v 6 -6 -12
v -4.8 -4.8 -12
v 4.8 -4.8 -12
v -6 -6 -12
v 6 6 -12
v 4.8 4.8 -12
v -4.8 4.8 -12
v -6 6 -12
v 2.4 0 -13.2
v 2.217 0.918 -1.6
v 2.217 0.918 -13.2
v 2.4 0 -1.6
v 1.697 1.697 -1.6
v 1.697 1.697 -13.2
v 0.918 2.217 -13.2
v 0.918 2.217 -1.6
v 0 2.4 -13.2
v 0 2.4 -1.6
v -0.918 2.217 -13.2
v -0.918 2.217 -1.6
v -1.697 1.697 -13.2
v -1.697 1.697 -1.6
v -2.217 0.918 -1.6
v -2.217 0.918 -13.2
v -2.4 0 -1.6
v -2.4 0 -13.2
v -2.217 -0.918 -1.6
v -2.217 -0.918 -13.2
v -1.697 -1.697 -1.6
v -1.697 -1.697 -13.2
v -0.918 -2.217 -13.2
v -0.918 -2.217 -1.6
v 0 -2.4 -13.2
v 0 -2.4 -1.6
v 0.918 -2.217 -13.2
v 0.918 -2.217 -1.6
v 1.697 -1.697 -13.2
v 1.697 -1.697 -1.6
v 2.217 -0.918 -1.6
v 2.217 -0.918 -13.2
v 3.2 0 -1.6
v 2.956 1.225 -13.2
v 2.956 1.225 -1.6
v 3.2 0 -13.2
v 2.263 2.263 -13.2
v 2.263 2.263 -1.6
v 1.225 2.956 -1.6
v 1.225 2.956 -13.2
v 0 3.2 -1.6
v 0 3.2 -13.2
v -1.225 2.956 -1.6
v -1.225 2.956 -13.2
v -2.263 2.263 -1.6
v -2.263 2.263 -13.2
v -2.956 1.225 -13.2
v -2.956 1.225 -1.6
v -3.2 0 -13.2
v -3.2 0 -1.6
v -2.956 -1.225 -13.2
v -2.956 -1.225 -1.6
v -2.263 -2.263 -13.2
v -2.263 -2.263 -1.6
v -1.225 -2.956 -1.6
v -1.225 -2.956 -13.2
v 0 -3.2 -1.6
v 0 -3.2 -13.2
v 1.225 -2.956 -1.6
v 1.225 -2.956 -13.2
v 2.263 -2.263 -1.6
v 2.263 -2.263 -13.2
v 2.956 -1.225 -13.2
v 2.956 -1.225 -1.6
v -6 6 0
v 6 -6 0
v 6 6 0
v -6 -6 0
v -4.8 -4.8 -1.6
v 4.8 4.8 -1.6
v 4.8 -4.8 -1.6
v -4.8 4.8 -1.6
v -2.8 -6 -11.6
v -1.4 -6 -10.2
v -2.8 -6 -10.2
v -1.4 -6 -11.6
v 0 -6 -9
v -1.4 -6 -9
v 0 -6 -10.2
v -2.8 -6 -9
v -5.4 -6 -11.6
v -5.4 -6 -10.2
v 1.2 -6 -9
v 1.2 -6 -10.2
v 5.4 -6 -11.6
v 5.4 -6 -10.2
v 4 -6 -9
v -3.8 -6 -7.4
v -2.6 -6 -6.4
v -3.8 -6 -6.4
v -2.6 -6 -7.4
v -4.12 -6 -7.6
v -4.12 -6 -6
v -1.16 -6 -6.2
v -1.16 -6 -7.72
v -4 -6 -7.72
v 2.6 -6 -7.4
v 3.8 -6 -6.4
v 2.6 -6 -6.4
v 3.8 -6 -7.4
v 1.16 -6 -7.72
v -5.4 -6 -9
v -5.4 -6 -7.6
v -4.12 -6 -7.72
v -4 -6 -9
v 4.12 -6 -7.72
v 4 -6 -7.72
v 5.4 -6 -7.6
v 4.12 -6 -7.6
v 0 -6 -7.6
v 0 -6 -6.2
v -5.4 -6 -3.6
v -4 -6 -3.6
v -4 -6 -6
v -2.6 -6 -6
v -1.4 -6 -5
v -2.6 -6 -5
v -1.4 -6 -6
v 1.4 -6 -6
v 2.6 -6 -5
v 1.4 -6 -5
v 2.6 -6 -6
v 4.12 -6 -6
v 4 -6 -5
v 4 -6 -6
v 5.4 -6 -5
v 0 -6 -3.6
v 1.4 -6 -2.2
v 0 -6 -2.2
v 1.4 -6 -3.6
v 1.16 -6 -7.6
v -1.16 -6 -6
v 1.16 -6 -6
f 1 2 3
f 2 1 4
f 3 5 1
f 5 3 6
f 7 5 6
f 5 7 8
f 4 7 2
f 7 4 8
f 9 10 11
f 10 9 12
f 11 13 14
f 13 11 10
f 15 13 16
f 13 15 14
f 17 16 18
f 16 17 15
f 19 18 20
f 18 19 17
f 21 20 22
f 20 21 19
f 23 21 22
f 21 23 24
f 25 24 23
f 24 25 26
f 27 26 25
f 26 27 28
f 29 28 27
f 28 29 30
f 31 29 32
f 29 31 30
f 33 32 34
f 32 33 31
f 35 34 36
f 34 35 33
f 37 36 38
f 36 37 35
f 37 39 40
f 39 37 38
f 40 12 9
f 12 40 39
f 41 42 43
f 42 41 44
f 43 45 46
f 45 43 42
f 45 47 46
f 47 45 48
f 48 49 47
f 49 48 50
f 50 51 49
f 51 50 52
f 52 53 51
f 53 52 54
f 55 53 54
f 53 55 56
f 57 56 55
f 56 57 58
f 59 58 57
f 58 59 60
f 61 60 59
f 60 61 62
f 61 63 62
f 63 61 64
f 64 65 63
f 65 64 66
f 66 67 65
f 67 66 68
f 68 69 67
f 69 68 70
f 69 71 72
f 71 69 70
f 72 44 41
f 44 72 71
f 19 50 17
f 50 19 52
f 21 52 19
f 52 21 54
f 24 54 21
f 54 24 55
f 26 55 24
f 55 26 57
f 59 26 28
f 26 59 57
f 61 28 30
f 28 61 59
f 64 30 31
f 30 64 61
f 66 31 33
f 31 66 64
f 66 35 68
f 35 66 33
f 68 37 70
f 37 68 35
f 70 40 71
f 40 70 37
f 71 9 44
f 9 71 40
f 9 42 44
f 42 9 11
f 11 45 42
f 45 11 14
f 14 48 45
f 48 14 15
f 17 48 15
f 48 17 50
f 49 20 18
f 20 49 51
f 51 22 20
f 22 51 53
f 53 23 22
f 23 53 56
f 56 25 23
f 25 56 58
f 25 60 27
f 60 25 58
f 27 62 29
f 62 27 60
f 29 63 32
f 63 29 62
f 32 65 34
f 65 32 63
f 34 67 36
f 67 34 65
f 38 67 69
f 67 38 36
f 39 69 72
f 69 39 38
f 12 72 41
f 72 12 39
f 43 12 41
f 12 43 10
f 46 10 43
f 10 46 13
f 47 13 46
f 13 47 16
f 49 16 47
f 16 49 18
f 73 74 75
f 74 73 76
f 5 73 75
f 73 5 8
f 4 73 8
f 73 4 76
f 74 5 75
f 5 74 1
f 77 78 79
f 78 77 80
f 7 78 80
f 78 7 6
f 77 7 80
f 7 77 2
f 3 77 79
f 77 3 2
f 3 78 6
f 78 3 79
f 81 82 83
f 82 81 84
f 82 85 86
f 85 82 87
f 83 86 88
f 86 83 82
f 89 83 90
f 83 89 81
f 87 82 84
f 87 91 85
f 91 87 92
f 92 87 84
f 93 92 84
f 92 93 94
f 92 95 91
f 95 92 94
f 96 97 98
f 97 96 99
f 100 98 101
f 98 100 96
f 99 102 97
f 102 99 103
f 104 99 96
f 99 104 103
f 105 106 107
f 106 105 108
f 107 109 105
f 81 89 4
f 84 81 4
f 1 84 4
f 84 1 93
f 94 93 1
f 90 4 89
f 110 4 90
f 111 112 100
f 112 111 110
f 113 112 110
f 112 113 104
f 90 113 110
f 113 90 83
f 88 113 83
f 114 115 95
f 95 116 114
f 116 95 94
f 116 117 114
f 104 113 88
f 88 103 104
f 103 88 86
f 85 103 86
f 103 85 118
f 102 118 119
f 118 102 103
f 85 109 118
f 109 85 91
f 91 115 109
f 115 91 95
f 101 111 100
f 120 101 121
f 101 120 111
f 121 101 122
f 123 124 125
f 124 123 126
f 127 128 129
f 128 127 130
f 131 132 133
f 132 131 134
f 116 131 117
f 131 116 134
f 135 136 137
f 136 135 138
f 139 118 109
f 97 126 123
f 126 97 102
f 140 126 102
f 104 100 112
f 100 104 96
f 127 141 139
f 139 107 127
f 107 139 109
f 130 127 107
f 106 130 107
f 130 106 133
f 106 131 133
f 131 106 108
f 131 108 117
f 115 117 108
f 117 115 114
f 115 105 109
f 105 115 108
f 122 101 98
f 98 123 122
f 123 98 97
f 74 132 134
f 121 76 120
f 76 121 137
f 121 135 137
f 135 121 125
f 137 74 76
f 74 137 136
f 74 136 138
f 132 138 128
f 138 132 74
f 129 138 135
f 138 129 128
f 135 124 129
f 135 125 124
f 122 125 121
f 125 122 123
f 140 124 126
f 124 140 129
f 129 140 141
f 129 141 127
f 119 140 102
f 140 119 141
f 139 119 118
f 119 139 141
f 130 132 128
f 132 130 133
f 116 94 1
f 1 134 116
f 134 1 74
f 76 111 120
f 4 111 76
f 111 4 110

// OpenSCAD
// file: ../p/4-4ring3.scad
use <../lib.scad>
$fa=1; $fs=0.2;
function ldraw_lib__4_4ring3(realsolid=false) = [
// 0 Ring  3 x 1.0
// 0 Name: 4-4ring3.dat
// 0 Author: James Jessiman
// 0 !LDRAW_ORG Primitive UPDATE 2009-01
// 0 !LICENSE Licensed under CC BY 2.0 and CC BY 4.0 : see CAreadme.txt
// 
// 0 BFC CERTIFY CCW
  [0,"BFC","CERTIFY"],
  [0,"BFC","CCW"],
// 
// 0 !HISTORY 1998-12-15 [PTadmin] Official Update 1998-10
// 0 !HISTORY 2002-04-05 [hafhead] Added BFC statement
// 0 !HISTORY 2002-04-25 [PTadmin] Official Update 2002-02
// 0 !HISTORY 2007-06-24 [PTadmin] Header formatted for Contributor Agreement
// 0 !HISTORY 2008-07-01 [PTadmin] Official Update 2008-01
// 0 !HISTORY 2008-08-26 [cwdee] Switch polygon winding and rename
// 0 !HISTORY 2009-05-02 [PTadmin] Official Update 2009-01
// 
// 
// 4 16 -1.5308 0 3.6956 -1.1481 0 2.7717 0 0 3 0 0 4
  [4,16,-1.5308,0,3.6956,-1.1481,0,2.7717,0,0,3,0,0,4],
// 4 16 -2.8284 0 2.8284 -2.1213 0 2.1213 -1.1481 0 2.7717 -1.5308 0 3.6956
  [4,16,-2.8284,0,2.8284,-2.1213,0,2.1213,-1.1481,0,2.7717,-1.5308,0,3.6956],
// 4 16 -3.6956 0 1.5308 -2.7717 0 1.1481 -2.1213 0 2.1213 -2.8284 0 2.8284
  [4,16,-3.6956,0,1.5308,-2.7717,0,1.1481,-2.1213,0,2.1213,-2.8284,0,2.8284],
// 4 16 -4 0 0 -3 0 0 -2.7717 0 1.1481 -3.6956 0 1.5308
  [4,16,-4,0,0,-3,0,0,-2.7717,0,1.1481,-3.6956,0,1.5308],
// 4 16 -3.6956 0 -1.5308 -2.7717 0 -1.1481 -3 0 0 -4 0 0
  [4,16,-3.6956,0,-1.5308,-2.7717,0,-1.1481,-3,0,0,-4,0,0],
// 4 16 -2.8284 0 -2.8284 -2.1213 0 -2.1213 -2.7717 0 -1.1481 -3.6956 0 -1.5308
  [4,16,-2.8284,0,-2.8284,-2.1213,0,-2.1213,-2.7717,0,-1.1481,-3.6956,0,-1.5308],
// 4 16 -1.5308 0 -3.6956 -1.1481 0 -2.7717 -2.1213 0 -2.1213 -2.8284 0 -2.8284
  [4,16,-1.5308,0,-3.6956,-1.1481,0,-2.7717,-2.1213,0,-2.1213,-2.8284,0,-2.8284],
// 4 16 0 0 -4 0 0 -3 -1.1481 0 -2.7717 -1.5308 0 -3.6956
  [4,16,0,0,-4,0,0,-3,-1.1481,0,-2.7717,-1.5308,0,-3.6956],
// 4 16 1.5308 0 -3.6956 1.1481 0 -2.7717 0 0 -3 0 0 -4
  [4,16,1.5308,0,-3.6956,1.1481,0,-2.7717,0,0,-3,0,0,-4],
// 4 16 2.8284 0 -2.8284 2.1213 0 -2.1213 1.1481 0 -2.7717 1.5308 0 -3.6956
  [4,16,2.8284,0,-2.8284,2.1213,0,-2.1213,1.1481,0,-2.7717,1.5308,0,-3.6956],
// 4 16 3.6956 0 -1.5308 2.7717 0 -1.1481 2.1213 0 -2.1213 2.8284 0 -2.8284
  [4,16,3.6956,0,-1.5308,2.7717,0,-1.1481,2.1213,0,-2.1213,2.8284,0,-2.8284],
// 4 16 4 0 0 3 0 0 2.7717 0 -1.1481 3.6956 0 -1.5308
  [4,16,4,0,0,3,0,0,2.7717,0,-1.1481,3.6956,0,-1.5308],
// 4 16 3.6956 0 1.5308 2.7717 0 1.1481 3 0 0 4 0 0
  [4,16,3.6956,0,1.5308,2.7717,0,1.1481,3,0,0,4,0,0],
// 4 16 2.8284 0 2.8284 2.1213 0 2.1213 2.7717 0 1.1481 3.6956 0 1.5308
  [4,16,2.8284,0,2.8284,2.1213,0,2.1213,2.7717,0,1.1481,3.6956,0,1.5308],
// 4 16 1.5308 0 3.6956 1.1481 0 2.7717 2.1213 0 2.1213 2.8284 0 2.8284
  [4,16,1.5308,0,3.6956,1.1481,0,2.7717,2.1213,0,2.1213,2.8284,0,2.8284],
// 4 16 0 0 4 0 0 3 1.1481 0 2.7717 1.5308 0 3.6956
  [4,16,0,0,4,0,0,3,1.1481,0,2.7717,1.5308,0,3.6956],
// 0
];
module ldraw_lib__4_4ring3(step=0, col=false, unit=2/5, alt=false, line=0.2, solid=!$preview)
    makepoly(ldraw_lib__4_4ring3(solid), step=step, col=col, unit=unit, alt=alt, line=line, solid=solid);
ldraw_lib__4_4ring3(line=0.2);
// file: ../p/4-4edge.scad
use <../lib.scad>
function ldraw_lib__4_4edge() = [
// 0 Circle 1.0
// 0 Name: 4-4edge.dat
// 0 Author: James Jessiman
// 0 !LDRAW_ORG Primitive UPDATE 2017-01
// 0 !LICENSE Licensed under CC BY 2.0 and CC BY 4.0 : see CAreadme.txt
// 
// 0 BFC CERTIFY CCW
  [0,"BFC","CERTIFY"],
  [0,"BFC","CCW"],
// 
// 0 !HISTORY 1998-12-15 [PTadmin] Official Update 1998-10
// 0 !HISTORY 2005-12-28 [PTadmin] Official Update 2005-01
// 0 !HISTORY 2007-06-24 [PTadmin] Header formatted for Contributor Agreement
// 0 !HISTORY 2008-07-01 [PTadmin] Official Update 2008-01
// 0 !HISTORY 2017-01-15 [Steffen] BFCed
// 0 !HISTORY 2017-12-30 [PTadmin] Official Update 2017-01
// 
// 
// 2 24 1 0 0 0.9239 0 0.3827
  [2,24,1,0,0,0.9239,0,0.3827],
// 2 24 0.9239 0 0.3827 0.7071 0 0.7071
  [2,24,0.9239,0,0.3827,0.7071,0,0.7071],
// 2 24 0.7071 0 0.7071 0.3827 0 0.9239
  [2,24,0.7071,0,0.7071,0.3827,0,0.9239],
// 2 24 0.3827 0 0.9239 0 0 1
  [2,24,0.3827,0,0.9239,0,0,1],
// 2 24 0 0 1 -0.3827 0 0.9239
  [2,24,0,0,1,-0.3827,0,0.9239],
// 2 24 -0.3827 0 0.9239 -0.7071 0 0.7071
  [2,24,-0.3827,0,0.9239,-0.7071,0,0.7071],
// 2 24 -0.7071 0 0.7071 -0.9239 0 0.3827
  [2,24,-0.7071,0,0.7071,-0.9239,0,0.3827],
// 2 24 -0.9239 0 0.3827 -1 0 -0
  [2,24,-0.9239,0,0.3827,-1,0,-0],
// 2 24 -1 0 -0 -0.9239 0 -0.3827
  [2,24,-1,0,-0,-0.9239,0,-0.3827],
// 2 24 -0.9239 0 -0.3827 -0.7071 0 -0.7071
  [2,24,-0.9239,0,-0.3827,-0.7071,0,-0.7071],
// 2 24 -0.7071 0 -0.7071 -0.3827 0 -0.9239
  [2,24,-0.7071,0,-0.7071,-0.3827,0,-0.9239],
// 2 24 -0.3827 0 -0.9239 0 0 -1
  [2,24,-0.3827,0,-0.9239,0,0,-1],
// 2 24 0 0 -1 0.3827 0 -0.9239
  [2,24,0,0,-1,0.3827,0,-0.9239],
// 2 24 0.3827 0 -0.9239 0.7071 0 -0.7071
  [2,24,0.3827,0,-0.9239,0.7071,0,-0.7071],
// 2 24 0.7071 0 -0.7071 0.9239 0 -0.3827
  [2,24,0.7071,0,-0.7071,0.9239,0,-0.3827],
// 2 24 0.9239 0 -0.3827 1 0 0
  [2,24,0.9239,0,-0.3827,1,0,0],
];
module ldraw_lib__4_4edge(step=0, col=false, unit=2/5, alt=false, line=0.2, solid=!$preview)
    makepoly(ldraw_lib__4_4edge(), step=step, col=col, unit=unit, alt=alt, line=line, solid=solid);
ldraw_lib__4_4edge(line=0.2);
// file: ../p/4-4cyli.scad
use <../lib.scad>
$fa=1; $fs=0.2;
function ldraw_lib__4_4cyli(realsolid=false) = [
// 0 Cylinder 1.0
// 0 Name: 4-4cyli.dat
// 0 Author: James Jessiman
// 0 !LDRAW_ORG Primitive UPDATE 2005-01
// 0 !LICENSE Licensed under CC BY 2.0 and CC BY 4.0 : see CAreadme.txt
// 
// 0 BFC CERTIFY CCW
  [0,"BFC","CERTIFY"],
  [0,"BFC","CCW"],
// 
// 0 !HISTORY 1998-12-15 [PTadmin] Official Update 1998-10
// 0 !HISTORY 2002-03-23 [sbliss] Added BFC statement; merged headers from files in distributions LDraw 0.27 and Complete.
// 0 !HISTORY 2002-04-25 [PTadmin] Official Update 2002-02
// 0 !HISTORY 2004-12-14 [guyvivan] BFC CCW
// 0 !HISTORY 2005-12-28 [PTadmin] Official Update 2005-01
// 0 !HISTORY 2007-06-24 [PTadmin] Header formatted for Contributor Agreement
// 0 !HISTORY 2008-07-01 [PTadmin] Official Update 2008-01
// 
// 
// 4 16 1 1 0 0.9239 1 0.3827 0.9239 0 0.3827 1 0 0
  [4,16,1,1,0,0.9239,1,0.3827,0.9239,0,0.3827,1,0,0],
// 5 24 1 0 0 1 1 0 0.9239 0 0.3827 0.9239 0 -0.3827
  [5,24,1,0,0,1,1,0,0.9239,0,0.3827,0.9239,0,-0.3827],
// 4 16 0.9239 1 0.3827 0.7071 1 0.7071 0.7071 0 0.7071 0.9239 0 0.3827
  [4,16,0.9239,1,0.3827,0.7071,1,0.7071,0.7071,0,0.7071,0.9239,0,0.3827],
// 5 24 0.9239 0 0.3827 0.9239 1 0.3827 0.7071 0 0.7071 1 0 0
  [5,24,0.9239,0,0.3827,0.9239,1,0.3827,0.7071,0,0.7071,1,0,0],
// 4 16 0.7071 1 0.7071 0.3827 1 0.9239 0.3827 0 0.9239 0.7071 0 0.7071
  [4,16,0.7071,1,0.7071,0.3827,1,0.9239,0.3827,0,0.9239,0.7071,0,0.7071],
// 5 24 0.7071 0 0.7071 0.7071 1 0.7071 0.3827 0 0.9239 0.9239 0 0.3827
  [5,24,0.7071,0,0.7071,0.7071,1,0.7071,0.3827,0,0.9239,0.9239,0,0.3827],
// 4 16 0.3827 1 0.9239 0 1 1 0 0 1 0.3827 0 0.9239
  [4,16,0.3827,1,0.9239,0,1,1,0,0,1,0.3827,0,0.9239],
// 5 24 0.3827 0 0.9239 0.3827 1 0.9239 0 0 1 0.7071 0 0.7071
  [5,24,0.3827,0,0.9239,0.3827,1,0.9239,0,0,1,0.7071,0,0.7071],
// 4 16 0 1 1 -0.3827 1 0.9239 -0.3827 0 0.9239 0 0 1
  [4,16,0,1,1,-0.3827,1,0.9239,-0.3827,0,0.9239,0,0,1],
// 5 24 0 0 1 0 1 1 -0.3827 0 0.9239 0.3827 0 0.9239
  [5,24,0,0,1,0,1,1,-0.3827,0,0.9239,0.3827,0,0.9239],
// 4 16 -0.3827 1 0.9239 -0.7071 1 0.7071 -0.7071 0 0.7071 -0.3827 0 0.9239
  [4,16,-0.3827,1,0.9239,-0.7071,1,0.7071,-0.7071,0,0.7071,-0.3827,0,0.9239],
// 5 24 -0.3827 0 0.9239 -0.3827 1 0.9239 -0.7071 0 0.7071 0 0 1
  [5,24,-0.3827,0,0.9239,-0.3827,1,0.9239,-0.7071,0,0.7071,0,0,1],
// 4 16 -0.7071 1 0.7071 -0.9239 1 0.3827 -0.9239 0 0.3827 -0.7071 0 0.7071
  [4,16,-0.7071,1,0.7071,-0.9239,1,0.3827,-0.9239,0,0.3827,-0.7071,0,0.7071],
// 5 24 -0.7071 0 0.7071 -0.7071 1 0.7071 -0.9239 0 0.3827 -0.3827 0 0.9239
  [5,24,-0.7071,0,0.7071,-0.7071,1,0.7071,-0.9239,0,0.3827,-0.3827,0,0.9239],
// 4 16 -0.9239 1 0.3827 -1 1 0 -1 0 0 -0.9239 0 0.3827
  [4,16,-0.9239,1,0.3827,-1,1,0,-1,0,0,-0.9239,0,0.3827],
// 5 24 -0.9239 0 0.3827 -0.9239 1 0.3827 -1 0 0 -0.7071 0 0.7071
  [5,24,-0.9239,0,0.3827,-0.9239,1,0.3827,-1,0,0,-0.7071,0,0.7071],
// 4 16 -1 1 0 -0.9239 1 -0.3827 -0.9239 0 -0.3827 -1 0 0
  [4,16,-1,1,0,-0.9239,1,-0.3827,-0.9239,0,-0.3827,-1,0,0],
// 5 24 -1 0 0 -1 1 0 -0.9239 0 -0.3827 -0.9239 0 0.3827
  [5,24,-1,0,0,-1,1,0,-0.9239,0,-0.3827,-0.9239,0,0.3827],
// 4 16 -0.9239 1 -0.3827 -0.7071 1 -0.7071 -0.7071 0 -0.7071 -0.9239 0 -0.3827
  [4,16,-0.9239,1,-0.3827,-0.7071,1,-0.7071,-0.7071,0,-0.7071,-0.9239,0,-0.3827],
// 5 24 -0.9239 0 -0.3827 -0.9239 1 -0.3827 -0.7071 0 -0.7071 -1 0 0
  [5,24,-0.9239,0,-0.3827,-0.9239,1,-0.3827,-0.7071,0,-0.7071,-1,0,0],
// 4 16 -0.7071 1 -0.7071 -0.3827 1 -0.9239 -0.3827 0 -0.9239 -0.7071 0 -0.7071
  [4,16,-0.7071,1,-0.7071,-0.3827,1,-0.9239,-0.3827,0,-0.9239,-0.7071,0,-0.7071],
// 5 24 -0.7071 0 -0.7071 -0.7071 1 -0.7071 -0.3827 0 -0.9239 -0.9239 0 -0.3827
  [5,24,-0.7071,0,-0.7071,-0.7071,1,-0.7071,-0.3827,0,-0.9239,-0.9239,0,-0.3827],
// 4 16 -0.3827 1 -0.9239 0 1 -1 0 0 -1 -0.3827 0 -0.9239
  [4,16,-0.3827,1,-0.9239,0,1,-1,0,0,-1,-0.3827,0,-0.9239],
// 5 24 -0.3827 0 -0.9239 -0.3827 1 -0.9239 0 0 -1 -0.7071 0 -0.7071
  [5,24,-0.3827,0,-0.9239,-0.3827,1,-0.9239,0,0,-1,-0.7071,0,-0.7071],
// 4 16 0 1 -1 0.3827 1 -0.9239 0.3827 0 -0.9239 0 0 -1
  [4,16,0,1,-1,0.3827,1,-0.9239,0.3827,0,-0.9239,0,0,-1],
// 5 24 0 0 -1 0 1 -1 0.3827 0 -0.9239 -0.3827 0 -0.9239
  [5,24,0,0,-1,0,1,-1,0.3827,0,-0.9239,-0.3827,0,-0.9239],
// 4 16 0.3827 1 -0.9239 0.7071 1 -0.7071 0.7071 0 -0.7071 0.3827 0 -0.9239
  [4,16,0.3827,1,-0.9239,0.7071,1,-0.7071,0.7071,0,-0.7071,0.3827,0,-0.9239],
// 5 24 0.3827 0 -0.9239 0.3827 1 -0.9239 0.7071 0 -0.7071 0 0 -1
  [5,24,0.3827,0,-0.9239,0.3827,1,-0.9239,0.7071,0,-0.7071,0,0,-1],
// 4 16 0.7071 1 -0.7071 0.9239 1 -0.3827 0.9239 0 -0.3827 0.7071 0 -0.7071
  [4,16,0.7071,1,-0.7071,0.9239,1,-0.3827,0.9239,0,-0.3827,0.7071,0,-0.7071],
// 5 24 0.7071 0 -0.7071 0.7071 1 -0.7071 0.9239 0 -0.3827 0.3827 0 -0.9239
  [5,24,0.7071,0,-0.7071,0.7071,1,-0.7071,0.9239,0,-0.3827,0.3827,0,-0.9239],
// 4 16 0.9239 1 -0.3827 1 1 0 1 0 0 0.9239 0 -0.3827
  [4,16,0.9239,1,-0.3827,1,1,0,1,0,0,0.9239,0,-0.3827],
// 5 24 0.9239 0 -0.3827 0.9239 1 -0.3827 1 0 0 0.7071 0 -0.7071
  [5,24,0.9239,0,-0.3827,0.9239,1,-0.3827,1,0,0,0.7071,0,-0.7071],
// 0
];
module ldraw_lib__4_4cyli(step=0, col=false, unit=2/5, alt=false, line=0.2, solid=!$preview)
    makepoly(ldraw_lib__4_4cyli(solid), step=step, col=col, unit=unit, alt=alt, line=line, solid=solid);
ldraw_lib__4_4cyli(line=0.2);
// file: ../p/stud4.scad
use <../lib.scad>
use <4-4cyli.scad>
use <4-4edge.scad>
use <4-4ring3.scad>
function ldraw_lib__stud4() = [
// 0 Stud Tube Open
// 0 Name: stud4.dat
// 0 Author: James Jessiman
// 0 !LDRAW_ORG Primitive UPDATE 2009-02
// 0 !LICENSE Licensed under CC BY 4.0 : see CAreadme.txt
// 
// 0 BFC CERTIFY CCW
  [0,"BFC","CERTIFY"],
  [0,"BFC","CCW"],
// 
// 0 !HISTORY 1999-07-05 [PTadmin] Official Update 1999-05
// 0 !HISTORY 2002-04-04 [sbliss] Modified for BFC compliance
// 0 !HISTORY 2002-04-25 [PTadmin] Official Update 2002-02
// 0 !HISTORY 2007-06-24 [PTadmin] Header formatted for Contributor Agreement
// 0 !HISTORY 2008-07-01 [PTadmin] Official Update 2008-01
// 0 !HISTORY 2009-06-21 [cwdee] Update ring references to 4-4ring
// 0 !HISTORY 2009-09-03 [PTadmin] Official Update 2009-02
// 
// 
// 1 16 0 -4 0 6 0 0 0 1 0 0 0 6 4-4edge.dat
  [1,16,0,-4,0,6,0,0,0,1,0,0,0,6, ldraw_lib__4_4edge()],
// 1 16 0 -4 0 8 0 0 0 1 0 0 0 8 4-4edge.dat
  [1,16,0,-4,0,8,0,0,0,1,0,0,0,8, ldraw_lib__4_4edge()],
// 1 16 0 0 0 6 0 0 0 1 0 0 0 6 4-4edge.dat
  [1,16,0,0,0,6,0,0,0,1,0,0,0,6, ldraw_lib__4_4edge()],
// 1 16 0 0 0 8 0 0 0 1 0 0 0 8 4-4edge.dat
  [1,16,0,0,0,8,0,0,0,1,0,0,0,8, ldraw_lib__4_4edge()],
// 0 BFC INVERTNEXT
  [0,"BFC","INVERTNEXT"],
// 1 16 0 -4 0 6 0 0 0 4 0 0 0 6 4-4cyli.dat
  [1,16,0,-4,0,6,0,0,0,4,0,0,0,6, ldraw_lib__4_4cyli()],
// 1 16 0 -4 0 8 0 0 0 4 0 0 0 8 4-4cyli.dat
  [1,16,0,-4,0,8,0,0,0,4,0,0,0,8, ldraw_lib__4_4cyli()],
// 1 16 0 -4 0 2 0 0 0 1 0 0 0 2 4-4ring3.dat
  [1,16,0,-4,0,2,0,0,0,1,0,0,0,2, ldraw_lib__4_4ring3()],
  [-1,16,0,0,0,2,0,0,0,-1,0,0,0,2, ldraw_lib__4_4ring3()],
// 0
];
module ldraw_lib__stud4(step=0, col=false, unit=2/5, alt=false, line=0.2, solid=!$preview)
    makepoly(ldraw_lib__stud4(), step=step, col=col, unit=unit, alt=alt, line=line, solid=solid);
ldraw_lib__stud4(line=0.2);
// file: ../p/box5.scad
use <../lib.scad>
function ldraw_lib__box5() = [
// 0 Box with 5 Faces and All Edges
// 0 Name: box5.dat
// 0 Author: James Jessiman
// 0 !LDRAW_ORG Primitive UPDATE 2012-01
// 0 !LICENSE Licensed under CC BY 2.0 and CC BY 4.0 : see CAreadme.txt
// 
// 0 BFC CERTIFY CCW
  [0,"BFC","CERTIFY"],
  [0,"BFC","CCW"],
// 
// 0 !HISTORY 2002-04-03 [sbliss] Modified for BFC compliance
// 0 !HISTORY 2002-04-25 [PTadmin] Official Update 2002-02
// 0 !HISTORY 2007-06-24 [PTadmin] Header formatted for Contributor Agreement
// 0 !HISTORY 2008-07-01 [PTadmin] Official Update 2008-01
// 0 !HISTORY 2012-02-16 [Philo] Changed to CCW
// 0 !HISTORY 2012-03-30 [PTadmin] Official Update 2012-01
// 
// 
// 2 24 1 1 1 -1 1 1
  [2,24,1,1,1,-1,1,1],
// 2 24 -1 1 1 -1 1 -1
  [2,24,-1,1,1,-1,1,-1],
// 2 24 -1 1 -1 1 1 -1
  [2,24,-1,1,-1,1,1,-1],
// 2 24 1 1 -1 1 1 1
  [2,24,1,1,-1,1,1,1],
// 2 24 1 0 1 -1 0 1
  [2,24,1,0,1,-1,0,1],
// 2 24 -1 0 1 -1 0 -1
  [2,24,-1,0,1,-1,0,-1],
// 2 24 -1 0 -1 1 0 -1
  [2,24,-1,0,-1,1,0,-1],
// 2 24 1 0 -1 1 0 1
  [2,24,1,0,-1,1,0,1],
// 2 24 1 0 1 1 1 1
  [2,24,1,0,1,1,1,1],
// 2 24 -1 0 1 -1 1 1
  [2,24,-1,0,1,-1,1,1],
// 2 24 1 0 -1 1 1 -1
  [2,24,1,0,-1,1,1,-1],
// 2 24 -1 0 -1 -1 1 -1
  [2,24,-1,0,-1,-1,1,-1],
// 4 16 -1 1 1 1 1 1 1 1 -1 -1 1 -1
  [4,16,-1,1,1,1,1,1,1,1,-1,-1,1,-1],
// 4 16 -1 1 1 -1 0 1 1 0 1 1 1 1
  [4,16,-1,1,1,-1,0,1,1,0,1,1,1,1],
// 4 16 -1 1 -1 -1 0 -1 -1 0 1 -1 1 1
  [4,16,-1,1,-1,-1,0,-1,-1,0,1,-1,1,1],
// 4 16 1 1 -1 1 0 -1 -1 0 -1 -1 1 -1
  [4,16,1,1,-1,1,0,-1,-1,0,-1,-1,1,-1],
// 4 16 1 1 1 1 0 1 1 0 -1 1 1 -1
  [4,16,1,1,1,1,0,1,1,0,-1,1,1,-1],
];
makepoly(ldraw_lib__box5(), line=0.2);
// file: ../p/box4t.scad
use <../lib.scad>
function ldraw_lib__box4t() = [
// 0 Box with 4 Adjacent Faces and All Edges
// 0 Name: box4t.dat
// 0 Author: Tore Eriksson [Tore_Eriksson]
// 0 !LDRAW_ORG Primitive UPDATE 2003-02
// 0 !LICENSE Licensed under CC BY 2.0 and CC BY 4.0 : see CAreadme.txt
// 
// 0 BFC CERTIFY CCW
  [0,"BFC","CERTIFY"],
  [0,"BFC","CCW"],
// 
// 0 !HISTORY 1997-09-29 [PTadmin] Official Update 1997-15
// 0 !HISTORY 2002-08-31 [izanette] Modified with WINDZ for BFC compliance
// 0 !HISTORY 2003-08-01 [PTadmin] Official Update 2003-02
// 0 !HISTORY 2007-06-24 [PTadmin] Header formatted for Contributor Agreement
// 0 !HISTORY 2008-07-01 [PTadmin] Official Update 2008-01
// 
// 
// 2 24 1 1 1 -1 1 1
  [2,24,1,1,1,-1,1,1],
// 2 24 -1 1 1 -1 1 -1
  [2,24,-1,1,1,-1,1,-1],
// 2 24 -1 1 -1 1 1 -1
  [2,24,-1,1,-1,1,1,-1],
// 2 24 1 1 -1 1 1 1
  [2,24,1,1,-1,1,1,1],
// 2 24 1 0 1 -1 0 1
  [2,24,1,0,1,-1,0,1],
// 2 24 -1 0 1 -1 0 -1
  [2,24,-1,0,1,-1,0,-1],
// 2 24 -1 0 -1 1 0 -1
  [2,24,-1,0,-1,1,0,-1],
// 2 24 1 0 -1 1 0 1
  [2,24,1,0,-1,1,0,1],
// 2 24 1 0 1 1 1 1
  [2,24,1,0,1,1,1,1],
// 2 24 -1 0 1 -1 1 1
  [2,24,-1,0,1,-1,1,1],
// 2 24 1 0 -1 1 1 -1
  [2,24,1,0,-1,1,1,-1],
// 2 24 -1 0 -1 -1 1 -1
  [2,24,-1,0,-1,-1,1,-1],
// 4 16 1 1 1 1 1 -1 -1 1 -1 -1 1 1
  [4,16,1,1,1,1,1,-1,-1,1,-1,-1,1,1],
// 4 16 1 1 1 -1 1 1 -1 0 1 1 0 1
  [4,16,1,1,1,-1,1,1,-1,0,1,1,0,1],
// 4 16 -1 1 1 -1 1 -1 -1 0 -1 -1 0 1
  [4,16,-1,1,1,-1,1,-1,-1,0,-1,-1,0,1],
// 0 4 16 -1 1 -1 -1 0 -1 1 0 -1 1 1 -1
// 4 16 1 1 -1 1 1 1 1 0 1 1 0 -1
  [4,16,1,1,-1,1,1,1,1,0,1,1,0,-1],
// 0
];
makepoly(ldraw_lib__box4t(), line=0.2);
// file: s/19729s01.scad
use <../../lib.scad>
use <../../p/box4t.scad>
use <../../p/box5.scad>
use <../../p/stud4.scad>
function ldraw_lib__s__19729s01() = [
// 0 ~Minifig Head Cuboid without Front Surface
// 0 Name: s\19729s01.dat
// 0 Author: Mark Kennedy [mkennedy]
// 0 !LDRAW_ORG Subpart UPDATE 2016-01
// 0 !LICENSE Licensed under CC BY 4.0 : see CAreadme.txt
// 
// 0 BFC CERTIFY CW
  [0,"BFC","CERTIFY"],
  [0,"BFC","CW"],
// 
// 0 !HISTORY 2016-03-18 {LEGO Digital Designer} Original part shape
// 0 !HISTORY 2016-03-28 [mkennedy] Primitive substitution
// 0 !HISTORY 2016-12-31 [PTadmin] Official Update 2016-01
// 
// 
// 4 16 15 30 -15 12 30 -12 -12 30 -12 -15 30 -15
  [4,16,15,30,-15,12,30,-12,-12,30,-12,-15,30,-15],
// 4 16 15 30 15 12 30 12 12 30 -12 15 30 -15
  [4,16,15,30,15,12,30,12,12,30,-12,15,30,-15],
// 4 16 -15 30 15 -12 30 12 12 30 12 15 30 15
  [4,16,-15,30,15,-12,30,12,12,30,12,15,30,15],
// 4 16 -15 30 -15 -12 30 -12 -12 30 12 -15 30 15
  [4,16,-15,30,-15,-12,30,-12,-12,30,12,-15,30,15],
// 0
// 1 16 0 4 0 1 0 0 0 -7.25 0 0 0 1 stud4.dat
  [1,16,0,4,0,1,0,0,0,-7.25,0,0,0,1, ldraw_lib__stud4()],
// 1 16 0 30 0 15 0 0 0 -30 0 0 0 15 box4t.dat
  [1,16,0,30,0,15,0,0,0,-30,0,0,0,15, ldraw_lib__box4t()],
// 0 BFC INVERTNEXT
  [0,"BFC","INVERTNEXT"],
// 1 16 0 30 0 12 0 0 0 -26 0 0 0 12 box5.dat
  [1,16,0,30,0,12,0,0,0,-26,0,0,0,12, ldraw_lib__box5()],
// 
];
module ldraw_lib__s__19729s01(step=0, col=false, unit=2/5, alt=false, line=0.2, solid=!$preview)
    makepoly(ldraw_lib__s__19729s01(), step=step, col=col, unit=unit, alt=alt, line=line, solid=solid);
ldraw_lib__s__19729s01(line=0.2);
// main file
use <../lib.scad>
use <s/19729s01.scad>
function ldraw_lib__19729p04() = [
// 0 Minifig Head Cuboid with Minecraft Blaze Pattern
// 0 Name: 19729p04.dat
// 0 Author: Evert-Jan Boer [ejboer]
// 0 !LDRAW_ORG Part UPDATE 2024-04
// 0 !LICENSE Licensed under CC BY 4.0 : see CAreadme.txt
// 
// 0 BFC CERTIFY CCW
  [0,"BFC","CERTIFY"],
  [0,"BFC","CCW"],
// 
// 0 !KEYWORDS Bricklink 19729pb007, Rebrickable 19729pr0010, Set 21122, Set 21143
// 0 !KEYWORDS Set 21154
// 
// 0 !HISTORY 2024-05-28 [OrionP] Official Update 2024-04
// 
// 
// 1 16 0 0 0 1 0 0 0 1 0 0 0 1 s\19729s01.dat
  [1,16,0,0,0,1,0,0,0,1,0,0,0,1, ldraw_lib__s__19729s01()],
// 4 4 -3.5 29 -15 -3.5 25.5 -15 -7 25.5 -15 -7 29 -15
  [4,4,-3.5,29,-15,-3.5,25.5,-15,-7,25.5,-15,-7,29,-15],
// 4 4 0 22.5 -15 -3.5 22.5 -15 -3.5 25.5 -15 0 25.5 -15
  [4,4,0,22.5,-15,-3.5,22.5,-15,-3.5,25.5,-15,0,25.5,-15],
// 4 484 -3.5 25.5 -15 -3.5 22.5 -15 -7 22.5 -15 -7 25.5 -15
  [4,484,-3.5,25.5,-15,-3.5,22.5,-15,-7,22.5,-15,-7,25.5,-15],
// 4 308 -13.5 29 -15 -7 29 -15 -7 25.5 -15 -13.5 25.5 -15
  [4,308,-13.5,29,-15,-7,29,-15,-7,25.5,-15,-13.5,25.5,-15],
// 3 308 0 25.5 -15 -3.5 25.5 -15 -3.5 29 -15
  [3,308,0,25.5,-15,-3.5,25.5,-15,-3.5,29,-15],
// 4 308 3 22.5 -15 0 22.5 -15 0 25.5 -15 3 25.5 -15
  [4,308,3,22.5,-15,0,22.5,-15,0,25.5,-15,3,25.5,-15],
// 3 308 3 25.5 -15 0 25.5 -15 -3.5 29 -15
  [3,308,3,25.5,-15,0,25.5,-15,-3.5,29,-15],
// 4 308 -3.5 29 -15 13.5 29 -15 13.5 25.5 -15 3 25.5 -15
  [4,308,-3.5,29,-15,13.5,29,-15,13.5,25.5,-15,3,25.5,-15],
// 4 484 13.5 25.5 -15 10 22.5 -15 3 22.5 -15 3 25.5 -15
  [4,484,13.5,25.5,-15,10,22.5,-15,3,22.5,-15,3,25.5,-15],
// 4 18 -9.5 18.5 -15 -6.5 18.5 -15 -6.5 16 -15 -9.5 16 -15
  [4,18,-9.5,18.5,-15,-6.5,18.5,-15,-6.5,16,-15,-9.5,16,-15],
// 4 308 -10.3 19 -15 -9.5 18.5 -15 -9.5 16 -15 -10.3 15 -15
  [4,308,-10.3,19,-15,-9.5,18.5,-15,-9.5,16,-15,-10.3,15,-15],
// 4 308 -2.9 15.5 -15 -6.5 16 -15 -6.5 18.5 -15 -2.9 19.3 -15
  [4,308,-2.9,15.5,-15,-6.5,16,-15,-6.5,18.5,-15,-2.9,19.3,-15],
// 4 308 -10 19.3 -15 -2.9 19.3 -15 -6.5 18.5 -15 -9.5 18.5 -15
  [4,308,-10,19.3,-15,-2.9,19.3,-15,-6.5,18.5,-15,-9.5,18.5,-15],
// 4 18 6.5 16 -15 6.5 18.5 -15 9.5 18.5 -15 9.5 16 -15
  [4,18,6.5,16,-15,6.5,18.5,-15,9.5,18.5,-15,9.5,16,-15],
// 3 308 6.5 16 -15 2.9 19.3 -15 6.5 18.5 -15
  [3,308,6.5,16,-15,2.9,19.3,-15,6.5,18.5,-15],
// 3 16 -7 29 -15 -13.5 29 -15 -15 30 -15
  [3,16,-7,29,-15,-13.5,29,-15,-15,30,-15],
// 3 16 -3.5 29 -15 -7 29 -15 -15 30 -15
  [3,16,-3.5,29,-15,-7,29,-15,-15,30,-15],
// 4 16 -15 30 -15 15 30 -15 13.5 29 -15 -3.5 29 -15
  [4,16,-15,30,-15,15,30,-15,13.5,29,-15,-3.5,29,-15],
// 3 16 13.5 25.5 -15 13.5 29 -15 15 30 -15
  [3,16,13.5,25.5,-15,13.5,29,-15,15,30,-15],
// 3 16 -13.5 25.5 -15 -15 30 -15 -13.5 29 -15
  [3,16,-13.5,25.5,-15,-15,30,-15,-13.5,29,-15],
// 3 16 -13.5 22.5 -15 -15 30 -15 -13.5 25.5 -15
  [3,16,-13.5,22.5,-15,-15,30,-15,-13.5,25.5,-15],
// 4 484 -13.5 19 -15 -13.5 22.5 -15 -10.3 19.3 -15 -10.3 19 -15
  [4,484,-13.5,19,-15,-13.5,22.5,-15,-10.3,19.3,-15,-10.3,19,-15],
// 4 484 -10 19.3 -15 -10.3 19.3 -15 -13.5 22.5 -15 -10 22.5 -15
  [4,484,-10,19.3,-15,-10.3,19.3,-15,-13.5,22.5,-15,-10,22.5,-15],
// 4 4 -7 25.5 -15 -10 22.5 -15 -13.5 22.5 -15 -13.5 25.5 -15
  [4,4,-7,25.5,-15,-10,22.5,-15,-13.5,22.5,-15,-13.5,25.5,-15],
// 3 4 -7 22.5 -15 -10 22.5 -15 -7 25.5 -15
  [3,4,-7,22.5,-15,-10,22.5,-15,-7,25.5,-15],
// 3 484 10.3 19.3 -15 10 19.3 -15 10 22.5 -15
  [3,484,10.3,19.3,-15,10,19.3,-15,10,22.5,-15],
// 4 484 13.5 19 -15 10.3 19.3 -15 10 22.5 -15 13.5 25.5 -15
  [4,484,13.5,19,-15,10.3,19.3,-15,10,22.5,-15,13.5,25.5,-15],
// 3 484 13.5 19 -15 10.3 19 -15 10.3 19.3 -15
  [3,484,13.5,19,-15,10.3,19,-15,10.3,19.3,-15],
// 3 25 -10 19.3 -15 -10 22.5 -15 -7 22.5 -15
  [3,25,-10,19.3,-15,-10,22.5,-15,-7,22.5,-15],
// 4 25 -2.9 19.3 -15 -10 19.3 -15 -7 22.5 -15 -3.5 22.5 -15
  [4,25,-2.9,19.3,-15,-10,19.3,-15,-7,22.5,-15,-3.5,22.5,-15],
// 4 25 0 19 -15 -2.9 19.3 -15 -3.5 22.5 -15 0 22.5 -15
  [4,25,0,19,-15,-2.9,19.3,-15,-3.5,22.5,-15,0,22.5,-15],
// 4 25 -2.9 19.3 -15 0 19 -15 0 15.5 -15 -2.9 15.5 -15
  [4,25,-2.9,19.3,-15,0,19,-15,0,15.5,-15,-2.9,15.5,-15],
// 4 25 0 19 -15 0 22.5 -15 3 22.5 -15 2.9 19.3 -15
  [4,25,0,19,-15,0,22.5,-15,3,22.5,-15,2.9,19.3,-15],
// 4 25 10 22.5 -15 10 19.3 -15 2.9 19.3 -15 3 22.5 -15
  [4,25,10,22.5,-15,10,19.3,-15,2.9,19.3,-15,3,22.5,-15],
// 3 25 -10.3 15 -15 -13.5 19 -15 -10.3 19 -15
  [3,25,-10.3,15,-15,-13.5,19,-15,-10.3,19,-15],
// 4 25 -13.5 19 -15 -10.3 15 -15 -10 9 -15 -13.5 9 -15
  [4,25,-13.5,19,-15,-10.3,15,-15,-10,9,-15,-13.5,9,-15],
// 3 25 -10 9 -15 -10.3 15 -15 -10 15 -15
  [3,25,-10,9,-15,-10.3,15,-15,-10,15,-15],
// 4 25 -3.5 15 -15 -3.5 12.5 -15 -6.5 12.5 -15 -6.5 15 -15
  [4,25,-3.5,15,-15,-3.5,12.5,-15,-6.5,12.5,-15,-6.5,15,-15],
// 4 25 6.5 15 -15 6.5 12.5 -15 3.5 12.5 -15 3.5 15 -15
  [4,25,6.5,15,-15,6.5,12.5,-15,3.5,12.5,-15,3.5,15,-15],
// 4 25 10.3 15 -15 13.5 12.5 -15 10 12.5 -15 10 15 -15
  [4,25,10.3,15,-15,13.5,12.5,-15,10,12.5,-15,10,15,-15],
// 4 25 10.3 19 -15 13.5 19 -15 13.5 12.5 -15 10.3 15 -15
  [4,25,10.3,19,-15,13.5,19,-15,13.5,12.5,-15,10.3,15,-15],
// 4 25 3.5 5.5 -15 0 5.5 -15 0 9 -15 3.5 9 -15
  [4,25,3.5,5.5,-15,0,5.5,-15,0,9,-15,3.5,9,-15],
// 3 25 2.9 19 -15 0 19 -15 2.9 19.3 -15
  [3,25,2.9,19,-15,0,19,-15,2.9,19.3,-15],
// 4 308 -2.9 15.5 -15 -3.5 15 -15 -6.5 15 -15 -6.5 16 -15
  [4,308,-2.9,15.5,-15,-3.5,15,-15,-6.5,15,-15,-6.5,16,-15],
// 3 308 -2.9 15 -15 -3.5 15 -15 -2.9 15.5 -15
  [3,308,-2.9,15,-15,-3.5,15,-15,-2.9,15.5,-15],
// 4 308 -10.3 19 -15 -10.3 19.3 -15 -10 19.3 -15 -9.5 18.5 -15
  [4,308,-10.3,19,-15,-10.3,19.3,-15,-10,19.3,-15,-9.5,18.5,-15],
// 3 308 3.5 15 -15 2.9 15 -15 2.9 19 -15
  [3,308,3.5,15,-15,2.9,15,-15,2.9,19,-15],
// 4 308 3.5 15 -15 2.9 19 -15 2.9 19.3 -15 6.5 16 -15
  [4,308,3.5,15,-15,2.9,19,-15,2.9,19.3,-15,6.5,16,-15],
// 3 308 6.5 15 -15 3.5 15 -15 6.5 16 -15
  [3,308,6.5,15,-15,3.5,15,-15,6.5,16,-15],
// 4 308 9.5 16 -15 10 15 -15 6.5 15 -15 6.5 16 -15
  [4,308,9.5,16,-15,10,15,-15,6.5,15,-15,6.5,16,-15],
// 4 308 9.5 18.5 -15 10.3 15 -15 10 15 -15 9.5 16 -15
  [4,308,9.5,18.5,-15,10.3,15,-15,10,15,-15,9.5,16,-15],
// 3 308 10.3 15 -15 9.5 18.5 -15 10.3 19 -15
  [3,308,10.3,15,-15,9.5,18.5,-15,10.3,19,-15],
// 4 308 9.5 18.5 -15 10 19.3 -15 10.3 19.3 -15 10.3 19 -15
  [4,308,9.5,18.5,-15,10,19.3,-15,10.3,19.3,-15,10.3,19,-15],
// 4 308 6.5 18.5 -15 2.9 19.3 -15 10 19.3 -15 9.5 18.5 -15
  [4,308,6.5,18.5,-15,2.9,19.3,-15,10,19.3,-15,9.5,18.5,-15],
// 3 308 -10 15 -15 -10.3 15 -15 -9.5 16 -15
  [3,308,-10,15,-15,-10.3,15,-15,-9.5,16,-15],
// 4 308 -6.5 15 -15 -10 15 -15 -9.5 16 -15 -6.5 16 -15
  [4,308,-6.5,15,-15,-10,15,-15,-9.5,16,-15,-6.5,16,-15],
// 3 16 15 0 -15 10 12.5 -15 13.5 12.5 -15
  [3,16,15,0,-15,10,12.5,-15,13.5,12.5,-15],
// 4 16 -13.5 9 -15 -10 9 -15 0 5.5 -15 -15 0 -15
  [4,16,-13.5,9,-15,-10,9,-15,0,5.5,-15,-15,0,-15],
// 4 16 -6.5 12.5 -15 0 9 -15 0 5.5 -15 -10 9 -15
  [4,16,-6.5,12.5,-15,0,9,-15,0,5.5,-15,-10,9,-15],
// 4 16 0 5.5 -15 3.5 5.5 -15 15 0 -15 -15 0 -15
  [4,16,0,5.5,-15,3.5,5.5,-15,15,0,-15,-15,0,-15],
// 3 16 15 0 -15 3.5 5.5 -15 3.5 9 -15
  [3,16,15,0,-15,3.5,5.5,-15,3.5,9,-15],
// 4 16 6.5 12.5 -15 10 12.5 -15 15 0 -15 3.5 9 -15
  [4,16,6.5,12.5,-15,10,12.5,-15,15,0,-15,3.5,9,-15],
// 4 16 0 9 -15 3.5 12.5 -15 6.5 12.5 -15 3.5 9 -15
  [4,16,0,9,-15,3.5,12.5,-15,6.5,12.5,-15,3.5,9,-15],
// 3 16 0 9 -15 -3.5 12.5 -15 3.5 12.5 -15
  [3,16,0,9,-15,-3.5,12.5,-15,3.5,12.5,-15],
// 3 16 0 9 -15 -6.5 12.5 -15 -3.5 12.5 -15
  [3,16,0,9,-15,-6.5,12.5,-15,-3.5,12.5,-15],
// 4 16 -6.5 15 -15 -6.5 12.5 -15 -10 9 -15 -10 15 -15
  [4,16,-6.5,15,-15,-6.5,12.5,-15,-10,9,-15,-10,15,-15],
// 4 16 -3.5 15 -15 -2.9 15 -15 3.5 12.5 -15 -3.5 12.5 -15
  [4,16,-3.5,15,-15,-2.9,15,-15,3.5,12.5,-15,-3.5,12.5,-15],
// 3 16 3.5 12.5 -15 -2.9 15 -15 2.9 15 -15
  [3,16,3.5,12.5,-15,-2.9,15,-15,2.9,15,-15],
// 3 16 3.5 12.5 -15 2.9 15 -15 3.5 15 -15
  [3,16,3.5,12.5,-15,2.9,15,-15,3.5,15,-15],
// 4 16 -2.9 15.5 -15 0 15.5 -15 2.9 15 -15 -2.9 15 -15
  [4,16,-2.9,15.5,-15,0,15.5,-15,2.9,15,-15,-2.9,15,-15],
// 4 16 0 19 -15 2.9 19 -15 2.9 15 -15 0 15.5 -15
  [4,16,0,19,-15,2.9,19,-15,2.9,15,-15,0,15.5,-15],
// 4 16 10 15 -15 10 12.5 -15 6.5 12.5 -15 6.5 15 -15
  [4,16,10,15,-15,10,12.5,-15,6.5,12.5,-15,6.5,15,-15],
// 3 16 13.5 19 -15 13.5 25.5 -15 15 30 -15
  [3,16,13.5,19,-15,13.5,25.5,-15,15,30,-15],
// 4 16 15 0 -15 13.5 12.5 -15 13.5 19 -15 15 30 -15
  [4,16,15,0,-15,13.5,12.5,-15,13.5,19,-15,15,30,-15],
// 3 16 -15 0 -15 -13.5 19 -15 -13.5 9 -15
  [3,16,-15,0,-15,-13.5,19,-15,-13.5,9,-15],
// 4 16 -15 0 -15 -15 30 -15 -13.5 22.5 -15 -13.5 19 -15
  [4,16,-15,0,-15,-15,30,-15,-13.5,22.5,-15,-13.5,19,-15],
];
module ldraw_lib__19729p04(step=0, col=false, unit=2/5, alt=false, line=0.2, solid=!$preview)
    makepoly(ldraw_lib__19729p04(), step=step, col=col, unit=unit, alt=alt, line=line, solid=solid);
ldraw_lib__19729p04(line=0.2);
